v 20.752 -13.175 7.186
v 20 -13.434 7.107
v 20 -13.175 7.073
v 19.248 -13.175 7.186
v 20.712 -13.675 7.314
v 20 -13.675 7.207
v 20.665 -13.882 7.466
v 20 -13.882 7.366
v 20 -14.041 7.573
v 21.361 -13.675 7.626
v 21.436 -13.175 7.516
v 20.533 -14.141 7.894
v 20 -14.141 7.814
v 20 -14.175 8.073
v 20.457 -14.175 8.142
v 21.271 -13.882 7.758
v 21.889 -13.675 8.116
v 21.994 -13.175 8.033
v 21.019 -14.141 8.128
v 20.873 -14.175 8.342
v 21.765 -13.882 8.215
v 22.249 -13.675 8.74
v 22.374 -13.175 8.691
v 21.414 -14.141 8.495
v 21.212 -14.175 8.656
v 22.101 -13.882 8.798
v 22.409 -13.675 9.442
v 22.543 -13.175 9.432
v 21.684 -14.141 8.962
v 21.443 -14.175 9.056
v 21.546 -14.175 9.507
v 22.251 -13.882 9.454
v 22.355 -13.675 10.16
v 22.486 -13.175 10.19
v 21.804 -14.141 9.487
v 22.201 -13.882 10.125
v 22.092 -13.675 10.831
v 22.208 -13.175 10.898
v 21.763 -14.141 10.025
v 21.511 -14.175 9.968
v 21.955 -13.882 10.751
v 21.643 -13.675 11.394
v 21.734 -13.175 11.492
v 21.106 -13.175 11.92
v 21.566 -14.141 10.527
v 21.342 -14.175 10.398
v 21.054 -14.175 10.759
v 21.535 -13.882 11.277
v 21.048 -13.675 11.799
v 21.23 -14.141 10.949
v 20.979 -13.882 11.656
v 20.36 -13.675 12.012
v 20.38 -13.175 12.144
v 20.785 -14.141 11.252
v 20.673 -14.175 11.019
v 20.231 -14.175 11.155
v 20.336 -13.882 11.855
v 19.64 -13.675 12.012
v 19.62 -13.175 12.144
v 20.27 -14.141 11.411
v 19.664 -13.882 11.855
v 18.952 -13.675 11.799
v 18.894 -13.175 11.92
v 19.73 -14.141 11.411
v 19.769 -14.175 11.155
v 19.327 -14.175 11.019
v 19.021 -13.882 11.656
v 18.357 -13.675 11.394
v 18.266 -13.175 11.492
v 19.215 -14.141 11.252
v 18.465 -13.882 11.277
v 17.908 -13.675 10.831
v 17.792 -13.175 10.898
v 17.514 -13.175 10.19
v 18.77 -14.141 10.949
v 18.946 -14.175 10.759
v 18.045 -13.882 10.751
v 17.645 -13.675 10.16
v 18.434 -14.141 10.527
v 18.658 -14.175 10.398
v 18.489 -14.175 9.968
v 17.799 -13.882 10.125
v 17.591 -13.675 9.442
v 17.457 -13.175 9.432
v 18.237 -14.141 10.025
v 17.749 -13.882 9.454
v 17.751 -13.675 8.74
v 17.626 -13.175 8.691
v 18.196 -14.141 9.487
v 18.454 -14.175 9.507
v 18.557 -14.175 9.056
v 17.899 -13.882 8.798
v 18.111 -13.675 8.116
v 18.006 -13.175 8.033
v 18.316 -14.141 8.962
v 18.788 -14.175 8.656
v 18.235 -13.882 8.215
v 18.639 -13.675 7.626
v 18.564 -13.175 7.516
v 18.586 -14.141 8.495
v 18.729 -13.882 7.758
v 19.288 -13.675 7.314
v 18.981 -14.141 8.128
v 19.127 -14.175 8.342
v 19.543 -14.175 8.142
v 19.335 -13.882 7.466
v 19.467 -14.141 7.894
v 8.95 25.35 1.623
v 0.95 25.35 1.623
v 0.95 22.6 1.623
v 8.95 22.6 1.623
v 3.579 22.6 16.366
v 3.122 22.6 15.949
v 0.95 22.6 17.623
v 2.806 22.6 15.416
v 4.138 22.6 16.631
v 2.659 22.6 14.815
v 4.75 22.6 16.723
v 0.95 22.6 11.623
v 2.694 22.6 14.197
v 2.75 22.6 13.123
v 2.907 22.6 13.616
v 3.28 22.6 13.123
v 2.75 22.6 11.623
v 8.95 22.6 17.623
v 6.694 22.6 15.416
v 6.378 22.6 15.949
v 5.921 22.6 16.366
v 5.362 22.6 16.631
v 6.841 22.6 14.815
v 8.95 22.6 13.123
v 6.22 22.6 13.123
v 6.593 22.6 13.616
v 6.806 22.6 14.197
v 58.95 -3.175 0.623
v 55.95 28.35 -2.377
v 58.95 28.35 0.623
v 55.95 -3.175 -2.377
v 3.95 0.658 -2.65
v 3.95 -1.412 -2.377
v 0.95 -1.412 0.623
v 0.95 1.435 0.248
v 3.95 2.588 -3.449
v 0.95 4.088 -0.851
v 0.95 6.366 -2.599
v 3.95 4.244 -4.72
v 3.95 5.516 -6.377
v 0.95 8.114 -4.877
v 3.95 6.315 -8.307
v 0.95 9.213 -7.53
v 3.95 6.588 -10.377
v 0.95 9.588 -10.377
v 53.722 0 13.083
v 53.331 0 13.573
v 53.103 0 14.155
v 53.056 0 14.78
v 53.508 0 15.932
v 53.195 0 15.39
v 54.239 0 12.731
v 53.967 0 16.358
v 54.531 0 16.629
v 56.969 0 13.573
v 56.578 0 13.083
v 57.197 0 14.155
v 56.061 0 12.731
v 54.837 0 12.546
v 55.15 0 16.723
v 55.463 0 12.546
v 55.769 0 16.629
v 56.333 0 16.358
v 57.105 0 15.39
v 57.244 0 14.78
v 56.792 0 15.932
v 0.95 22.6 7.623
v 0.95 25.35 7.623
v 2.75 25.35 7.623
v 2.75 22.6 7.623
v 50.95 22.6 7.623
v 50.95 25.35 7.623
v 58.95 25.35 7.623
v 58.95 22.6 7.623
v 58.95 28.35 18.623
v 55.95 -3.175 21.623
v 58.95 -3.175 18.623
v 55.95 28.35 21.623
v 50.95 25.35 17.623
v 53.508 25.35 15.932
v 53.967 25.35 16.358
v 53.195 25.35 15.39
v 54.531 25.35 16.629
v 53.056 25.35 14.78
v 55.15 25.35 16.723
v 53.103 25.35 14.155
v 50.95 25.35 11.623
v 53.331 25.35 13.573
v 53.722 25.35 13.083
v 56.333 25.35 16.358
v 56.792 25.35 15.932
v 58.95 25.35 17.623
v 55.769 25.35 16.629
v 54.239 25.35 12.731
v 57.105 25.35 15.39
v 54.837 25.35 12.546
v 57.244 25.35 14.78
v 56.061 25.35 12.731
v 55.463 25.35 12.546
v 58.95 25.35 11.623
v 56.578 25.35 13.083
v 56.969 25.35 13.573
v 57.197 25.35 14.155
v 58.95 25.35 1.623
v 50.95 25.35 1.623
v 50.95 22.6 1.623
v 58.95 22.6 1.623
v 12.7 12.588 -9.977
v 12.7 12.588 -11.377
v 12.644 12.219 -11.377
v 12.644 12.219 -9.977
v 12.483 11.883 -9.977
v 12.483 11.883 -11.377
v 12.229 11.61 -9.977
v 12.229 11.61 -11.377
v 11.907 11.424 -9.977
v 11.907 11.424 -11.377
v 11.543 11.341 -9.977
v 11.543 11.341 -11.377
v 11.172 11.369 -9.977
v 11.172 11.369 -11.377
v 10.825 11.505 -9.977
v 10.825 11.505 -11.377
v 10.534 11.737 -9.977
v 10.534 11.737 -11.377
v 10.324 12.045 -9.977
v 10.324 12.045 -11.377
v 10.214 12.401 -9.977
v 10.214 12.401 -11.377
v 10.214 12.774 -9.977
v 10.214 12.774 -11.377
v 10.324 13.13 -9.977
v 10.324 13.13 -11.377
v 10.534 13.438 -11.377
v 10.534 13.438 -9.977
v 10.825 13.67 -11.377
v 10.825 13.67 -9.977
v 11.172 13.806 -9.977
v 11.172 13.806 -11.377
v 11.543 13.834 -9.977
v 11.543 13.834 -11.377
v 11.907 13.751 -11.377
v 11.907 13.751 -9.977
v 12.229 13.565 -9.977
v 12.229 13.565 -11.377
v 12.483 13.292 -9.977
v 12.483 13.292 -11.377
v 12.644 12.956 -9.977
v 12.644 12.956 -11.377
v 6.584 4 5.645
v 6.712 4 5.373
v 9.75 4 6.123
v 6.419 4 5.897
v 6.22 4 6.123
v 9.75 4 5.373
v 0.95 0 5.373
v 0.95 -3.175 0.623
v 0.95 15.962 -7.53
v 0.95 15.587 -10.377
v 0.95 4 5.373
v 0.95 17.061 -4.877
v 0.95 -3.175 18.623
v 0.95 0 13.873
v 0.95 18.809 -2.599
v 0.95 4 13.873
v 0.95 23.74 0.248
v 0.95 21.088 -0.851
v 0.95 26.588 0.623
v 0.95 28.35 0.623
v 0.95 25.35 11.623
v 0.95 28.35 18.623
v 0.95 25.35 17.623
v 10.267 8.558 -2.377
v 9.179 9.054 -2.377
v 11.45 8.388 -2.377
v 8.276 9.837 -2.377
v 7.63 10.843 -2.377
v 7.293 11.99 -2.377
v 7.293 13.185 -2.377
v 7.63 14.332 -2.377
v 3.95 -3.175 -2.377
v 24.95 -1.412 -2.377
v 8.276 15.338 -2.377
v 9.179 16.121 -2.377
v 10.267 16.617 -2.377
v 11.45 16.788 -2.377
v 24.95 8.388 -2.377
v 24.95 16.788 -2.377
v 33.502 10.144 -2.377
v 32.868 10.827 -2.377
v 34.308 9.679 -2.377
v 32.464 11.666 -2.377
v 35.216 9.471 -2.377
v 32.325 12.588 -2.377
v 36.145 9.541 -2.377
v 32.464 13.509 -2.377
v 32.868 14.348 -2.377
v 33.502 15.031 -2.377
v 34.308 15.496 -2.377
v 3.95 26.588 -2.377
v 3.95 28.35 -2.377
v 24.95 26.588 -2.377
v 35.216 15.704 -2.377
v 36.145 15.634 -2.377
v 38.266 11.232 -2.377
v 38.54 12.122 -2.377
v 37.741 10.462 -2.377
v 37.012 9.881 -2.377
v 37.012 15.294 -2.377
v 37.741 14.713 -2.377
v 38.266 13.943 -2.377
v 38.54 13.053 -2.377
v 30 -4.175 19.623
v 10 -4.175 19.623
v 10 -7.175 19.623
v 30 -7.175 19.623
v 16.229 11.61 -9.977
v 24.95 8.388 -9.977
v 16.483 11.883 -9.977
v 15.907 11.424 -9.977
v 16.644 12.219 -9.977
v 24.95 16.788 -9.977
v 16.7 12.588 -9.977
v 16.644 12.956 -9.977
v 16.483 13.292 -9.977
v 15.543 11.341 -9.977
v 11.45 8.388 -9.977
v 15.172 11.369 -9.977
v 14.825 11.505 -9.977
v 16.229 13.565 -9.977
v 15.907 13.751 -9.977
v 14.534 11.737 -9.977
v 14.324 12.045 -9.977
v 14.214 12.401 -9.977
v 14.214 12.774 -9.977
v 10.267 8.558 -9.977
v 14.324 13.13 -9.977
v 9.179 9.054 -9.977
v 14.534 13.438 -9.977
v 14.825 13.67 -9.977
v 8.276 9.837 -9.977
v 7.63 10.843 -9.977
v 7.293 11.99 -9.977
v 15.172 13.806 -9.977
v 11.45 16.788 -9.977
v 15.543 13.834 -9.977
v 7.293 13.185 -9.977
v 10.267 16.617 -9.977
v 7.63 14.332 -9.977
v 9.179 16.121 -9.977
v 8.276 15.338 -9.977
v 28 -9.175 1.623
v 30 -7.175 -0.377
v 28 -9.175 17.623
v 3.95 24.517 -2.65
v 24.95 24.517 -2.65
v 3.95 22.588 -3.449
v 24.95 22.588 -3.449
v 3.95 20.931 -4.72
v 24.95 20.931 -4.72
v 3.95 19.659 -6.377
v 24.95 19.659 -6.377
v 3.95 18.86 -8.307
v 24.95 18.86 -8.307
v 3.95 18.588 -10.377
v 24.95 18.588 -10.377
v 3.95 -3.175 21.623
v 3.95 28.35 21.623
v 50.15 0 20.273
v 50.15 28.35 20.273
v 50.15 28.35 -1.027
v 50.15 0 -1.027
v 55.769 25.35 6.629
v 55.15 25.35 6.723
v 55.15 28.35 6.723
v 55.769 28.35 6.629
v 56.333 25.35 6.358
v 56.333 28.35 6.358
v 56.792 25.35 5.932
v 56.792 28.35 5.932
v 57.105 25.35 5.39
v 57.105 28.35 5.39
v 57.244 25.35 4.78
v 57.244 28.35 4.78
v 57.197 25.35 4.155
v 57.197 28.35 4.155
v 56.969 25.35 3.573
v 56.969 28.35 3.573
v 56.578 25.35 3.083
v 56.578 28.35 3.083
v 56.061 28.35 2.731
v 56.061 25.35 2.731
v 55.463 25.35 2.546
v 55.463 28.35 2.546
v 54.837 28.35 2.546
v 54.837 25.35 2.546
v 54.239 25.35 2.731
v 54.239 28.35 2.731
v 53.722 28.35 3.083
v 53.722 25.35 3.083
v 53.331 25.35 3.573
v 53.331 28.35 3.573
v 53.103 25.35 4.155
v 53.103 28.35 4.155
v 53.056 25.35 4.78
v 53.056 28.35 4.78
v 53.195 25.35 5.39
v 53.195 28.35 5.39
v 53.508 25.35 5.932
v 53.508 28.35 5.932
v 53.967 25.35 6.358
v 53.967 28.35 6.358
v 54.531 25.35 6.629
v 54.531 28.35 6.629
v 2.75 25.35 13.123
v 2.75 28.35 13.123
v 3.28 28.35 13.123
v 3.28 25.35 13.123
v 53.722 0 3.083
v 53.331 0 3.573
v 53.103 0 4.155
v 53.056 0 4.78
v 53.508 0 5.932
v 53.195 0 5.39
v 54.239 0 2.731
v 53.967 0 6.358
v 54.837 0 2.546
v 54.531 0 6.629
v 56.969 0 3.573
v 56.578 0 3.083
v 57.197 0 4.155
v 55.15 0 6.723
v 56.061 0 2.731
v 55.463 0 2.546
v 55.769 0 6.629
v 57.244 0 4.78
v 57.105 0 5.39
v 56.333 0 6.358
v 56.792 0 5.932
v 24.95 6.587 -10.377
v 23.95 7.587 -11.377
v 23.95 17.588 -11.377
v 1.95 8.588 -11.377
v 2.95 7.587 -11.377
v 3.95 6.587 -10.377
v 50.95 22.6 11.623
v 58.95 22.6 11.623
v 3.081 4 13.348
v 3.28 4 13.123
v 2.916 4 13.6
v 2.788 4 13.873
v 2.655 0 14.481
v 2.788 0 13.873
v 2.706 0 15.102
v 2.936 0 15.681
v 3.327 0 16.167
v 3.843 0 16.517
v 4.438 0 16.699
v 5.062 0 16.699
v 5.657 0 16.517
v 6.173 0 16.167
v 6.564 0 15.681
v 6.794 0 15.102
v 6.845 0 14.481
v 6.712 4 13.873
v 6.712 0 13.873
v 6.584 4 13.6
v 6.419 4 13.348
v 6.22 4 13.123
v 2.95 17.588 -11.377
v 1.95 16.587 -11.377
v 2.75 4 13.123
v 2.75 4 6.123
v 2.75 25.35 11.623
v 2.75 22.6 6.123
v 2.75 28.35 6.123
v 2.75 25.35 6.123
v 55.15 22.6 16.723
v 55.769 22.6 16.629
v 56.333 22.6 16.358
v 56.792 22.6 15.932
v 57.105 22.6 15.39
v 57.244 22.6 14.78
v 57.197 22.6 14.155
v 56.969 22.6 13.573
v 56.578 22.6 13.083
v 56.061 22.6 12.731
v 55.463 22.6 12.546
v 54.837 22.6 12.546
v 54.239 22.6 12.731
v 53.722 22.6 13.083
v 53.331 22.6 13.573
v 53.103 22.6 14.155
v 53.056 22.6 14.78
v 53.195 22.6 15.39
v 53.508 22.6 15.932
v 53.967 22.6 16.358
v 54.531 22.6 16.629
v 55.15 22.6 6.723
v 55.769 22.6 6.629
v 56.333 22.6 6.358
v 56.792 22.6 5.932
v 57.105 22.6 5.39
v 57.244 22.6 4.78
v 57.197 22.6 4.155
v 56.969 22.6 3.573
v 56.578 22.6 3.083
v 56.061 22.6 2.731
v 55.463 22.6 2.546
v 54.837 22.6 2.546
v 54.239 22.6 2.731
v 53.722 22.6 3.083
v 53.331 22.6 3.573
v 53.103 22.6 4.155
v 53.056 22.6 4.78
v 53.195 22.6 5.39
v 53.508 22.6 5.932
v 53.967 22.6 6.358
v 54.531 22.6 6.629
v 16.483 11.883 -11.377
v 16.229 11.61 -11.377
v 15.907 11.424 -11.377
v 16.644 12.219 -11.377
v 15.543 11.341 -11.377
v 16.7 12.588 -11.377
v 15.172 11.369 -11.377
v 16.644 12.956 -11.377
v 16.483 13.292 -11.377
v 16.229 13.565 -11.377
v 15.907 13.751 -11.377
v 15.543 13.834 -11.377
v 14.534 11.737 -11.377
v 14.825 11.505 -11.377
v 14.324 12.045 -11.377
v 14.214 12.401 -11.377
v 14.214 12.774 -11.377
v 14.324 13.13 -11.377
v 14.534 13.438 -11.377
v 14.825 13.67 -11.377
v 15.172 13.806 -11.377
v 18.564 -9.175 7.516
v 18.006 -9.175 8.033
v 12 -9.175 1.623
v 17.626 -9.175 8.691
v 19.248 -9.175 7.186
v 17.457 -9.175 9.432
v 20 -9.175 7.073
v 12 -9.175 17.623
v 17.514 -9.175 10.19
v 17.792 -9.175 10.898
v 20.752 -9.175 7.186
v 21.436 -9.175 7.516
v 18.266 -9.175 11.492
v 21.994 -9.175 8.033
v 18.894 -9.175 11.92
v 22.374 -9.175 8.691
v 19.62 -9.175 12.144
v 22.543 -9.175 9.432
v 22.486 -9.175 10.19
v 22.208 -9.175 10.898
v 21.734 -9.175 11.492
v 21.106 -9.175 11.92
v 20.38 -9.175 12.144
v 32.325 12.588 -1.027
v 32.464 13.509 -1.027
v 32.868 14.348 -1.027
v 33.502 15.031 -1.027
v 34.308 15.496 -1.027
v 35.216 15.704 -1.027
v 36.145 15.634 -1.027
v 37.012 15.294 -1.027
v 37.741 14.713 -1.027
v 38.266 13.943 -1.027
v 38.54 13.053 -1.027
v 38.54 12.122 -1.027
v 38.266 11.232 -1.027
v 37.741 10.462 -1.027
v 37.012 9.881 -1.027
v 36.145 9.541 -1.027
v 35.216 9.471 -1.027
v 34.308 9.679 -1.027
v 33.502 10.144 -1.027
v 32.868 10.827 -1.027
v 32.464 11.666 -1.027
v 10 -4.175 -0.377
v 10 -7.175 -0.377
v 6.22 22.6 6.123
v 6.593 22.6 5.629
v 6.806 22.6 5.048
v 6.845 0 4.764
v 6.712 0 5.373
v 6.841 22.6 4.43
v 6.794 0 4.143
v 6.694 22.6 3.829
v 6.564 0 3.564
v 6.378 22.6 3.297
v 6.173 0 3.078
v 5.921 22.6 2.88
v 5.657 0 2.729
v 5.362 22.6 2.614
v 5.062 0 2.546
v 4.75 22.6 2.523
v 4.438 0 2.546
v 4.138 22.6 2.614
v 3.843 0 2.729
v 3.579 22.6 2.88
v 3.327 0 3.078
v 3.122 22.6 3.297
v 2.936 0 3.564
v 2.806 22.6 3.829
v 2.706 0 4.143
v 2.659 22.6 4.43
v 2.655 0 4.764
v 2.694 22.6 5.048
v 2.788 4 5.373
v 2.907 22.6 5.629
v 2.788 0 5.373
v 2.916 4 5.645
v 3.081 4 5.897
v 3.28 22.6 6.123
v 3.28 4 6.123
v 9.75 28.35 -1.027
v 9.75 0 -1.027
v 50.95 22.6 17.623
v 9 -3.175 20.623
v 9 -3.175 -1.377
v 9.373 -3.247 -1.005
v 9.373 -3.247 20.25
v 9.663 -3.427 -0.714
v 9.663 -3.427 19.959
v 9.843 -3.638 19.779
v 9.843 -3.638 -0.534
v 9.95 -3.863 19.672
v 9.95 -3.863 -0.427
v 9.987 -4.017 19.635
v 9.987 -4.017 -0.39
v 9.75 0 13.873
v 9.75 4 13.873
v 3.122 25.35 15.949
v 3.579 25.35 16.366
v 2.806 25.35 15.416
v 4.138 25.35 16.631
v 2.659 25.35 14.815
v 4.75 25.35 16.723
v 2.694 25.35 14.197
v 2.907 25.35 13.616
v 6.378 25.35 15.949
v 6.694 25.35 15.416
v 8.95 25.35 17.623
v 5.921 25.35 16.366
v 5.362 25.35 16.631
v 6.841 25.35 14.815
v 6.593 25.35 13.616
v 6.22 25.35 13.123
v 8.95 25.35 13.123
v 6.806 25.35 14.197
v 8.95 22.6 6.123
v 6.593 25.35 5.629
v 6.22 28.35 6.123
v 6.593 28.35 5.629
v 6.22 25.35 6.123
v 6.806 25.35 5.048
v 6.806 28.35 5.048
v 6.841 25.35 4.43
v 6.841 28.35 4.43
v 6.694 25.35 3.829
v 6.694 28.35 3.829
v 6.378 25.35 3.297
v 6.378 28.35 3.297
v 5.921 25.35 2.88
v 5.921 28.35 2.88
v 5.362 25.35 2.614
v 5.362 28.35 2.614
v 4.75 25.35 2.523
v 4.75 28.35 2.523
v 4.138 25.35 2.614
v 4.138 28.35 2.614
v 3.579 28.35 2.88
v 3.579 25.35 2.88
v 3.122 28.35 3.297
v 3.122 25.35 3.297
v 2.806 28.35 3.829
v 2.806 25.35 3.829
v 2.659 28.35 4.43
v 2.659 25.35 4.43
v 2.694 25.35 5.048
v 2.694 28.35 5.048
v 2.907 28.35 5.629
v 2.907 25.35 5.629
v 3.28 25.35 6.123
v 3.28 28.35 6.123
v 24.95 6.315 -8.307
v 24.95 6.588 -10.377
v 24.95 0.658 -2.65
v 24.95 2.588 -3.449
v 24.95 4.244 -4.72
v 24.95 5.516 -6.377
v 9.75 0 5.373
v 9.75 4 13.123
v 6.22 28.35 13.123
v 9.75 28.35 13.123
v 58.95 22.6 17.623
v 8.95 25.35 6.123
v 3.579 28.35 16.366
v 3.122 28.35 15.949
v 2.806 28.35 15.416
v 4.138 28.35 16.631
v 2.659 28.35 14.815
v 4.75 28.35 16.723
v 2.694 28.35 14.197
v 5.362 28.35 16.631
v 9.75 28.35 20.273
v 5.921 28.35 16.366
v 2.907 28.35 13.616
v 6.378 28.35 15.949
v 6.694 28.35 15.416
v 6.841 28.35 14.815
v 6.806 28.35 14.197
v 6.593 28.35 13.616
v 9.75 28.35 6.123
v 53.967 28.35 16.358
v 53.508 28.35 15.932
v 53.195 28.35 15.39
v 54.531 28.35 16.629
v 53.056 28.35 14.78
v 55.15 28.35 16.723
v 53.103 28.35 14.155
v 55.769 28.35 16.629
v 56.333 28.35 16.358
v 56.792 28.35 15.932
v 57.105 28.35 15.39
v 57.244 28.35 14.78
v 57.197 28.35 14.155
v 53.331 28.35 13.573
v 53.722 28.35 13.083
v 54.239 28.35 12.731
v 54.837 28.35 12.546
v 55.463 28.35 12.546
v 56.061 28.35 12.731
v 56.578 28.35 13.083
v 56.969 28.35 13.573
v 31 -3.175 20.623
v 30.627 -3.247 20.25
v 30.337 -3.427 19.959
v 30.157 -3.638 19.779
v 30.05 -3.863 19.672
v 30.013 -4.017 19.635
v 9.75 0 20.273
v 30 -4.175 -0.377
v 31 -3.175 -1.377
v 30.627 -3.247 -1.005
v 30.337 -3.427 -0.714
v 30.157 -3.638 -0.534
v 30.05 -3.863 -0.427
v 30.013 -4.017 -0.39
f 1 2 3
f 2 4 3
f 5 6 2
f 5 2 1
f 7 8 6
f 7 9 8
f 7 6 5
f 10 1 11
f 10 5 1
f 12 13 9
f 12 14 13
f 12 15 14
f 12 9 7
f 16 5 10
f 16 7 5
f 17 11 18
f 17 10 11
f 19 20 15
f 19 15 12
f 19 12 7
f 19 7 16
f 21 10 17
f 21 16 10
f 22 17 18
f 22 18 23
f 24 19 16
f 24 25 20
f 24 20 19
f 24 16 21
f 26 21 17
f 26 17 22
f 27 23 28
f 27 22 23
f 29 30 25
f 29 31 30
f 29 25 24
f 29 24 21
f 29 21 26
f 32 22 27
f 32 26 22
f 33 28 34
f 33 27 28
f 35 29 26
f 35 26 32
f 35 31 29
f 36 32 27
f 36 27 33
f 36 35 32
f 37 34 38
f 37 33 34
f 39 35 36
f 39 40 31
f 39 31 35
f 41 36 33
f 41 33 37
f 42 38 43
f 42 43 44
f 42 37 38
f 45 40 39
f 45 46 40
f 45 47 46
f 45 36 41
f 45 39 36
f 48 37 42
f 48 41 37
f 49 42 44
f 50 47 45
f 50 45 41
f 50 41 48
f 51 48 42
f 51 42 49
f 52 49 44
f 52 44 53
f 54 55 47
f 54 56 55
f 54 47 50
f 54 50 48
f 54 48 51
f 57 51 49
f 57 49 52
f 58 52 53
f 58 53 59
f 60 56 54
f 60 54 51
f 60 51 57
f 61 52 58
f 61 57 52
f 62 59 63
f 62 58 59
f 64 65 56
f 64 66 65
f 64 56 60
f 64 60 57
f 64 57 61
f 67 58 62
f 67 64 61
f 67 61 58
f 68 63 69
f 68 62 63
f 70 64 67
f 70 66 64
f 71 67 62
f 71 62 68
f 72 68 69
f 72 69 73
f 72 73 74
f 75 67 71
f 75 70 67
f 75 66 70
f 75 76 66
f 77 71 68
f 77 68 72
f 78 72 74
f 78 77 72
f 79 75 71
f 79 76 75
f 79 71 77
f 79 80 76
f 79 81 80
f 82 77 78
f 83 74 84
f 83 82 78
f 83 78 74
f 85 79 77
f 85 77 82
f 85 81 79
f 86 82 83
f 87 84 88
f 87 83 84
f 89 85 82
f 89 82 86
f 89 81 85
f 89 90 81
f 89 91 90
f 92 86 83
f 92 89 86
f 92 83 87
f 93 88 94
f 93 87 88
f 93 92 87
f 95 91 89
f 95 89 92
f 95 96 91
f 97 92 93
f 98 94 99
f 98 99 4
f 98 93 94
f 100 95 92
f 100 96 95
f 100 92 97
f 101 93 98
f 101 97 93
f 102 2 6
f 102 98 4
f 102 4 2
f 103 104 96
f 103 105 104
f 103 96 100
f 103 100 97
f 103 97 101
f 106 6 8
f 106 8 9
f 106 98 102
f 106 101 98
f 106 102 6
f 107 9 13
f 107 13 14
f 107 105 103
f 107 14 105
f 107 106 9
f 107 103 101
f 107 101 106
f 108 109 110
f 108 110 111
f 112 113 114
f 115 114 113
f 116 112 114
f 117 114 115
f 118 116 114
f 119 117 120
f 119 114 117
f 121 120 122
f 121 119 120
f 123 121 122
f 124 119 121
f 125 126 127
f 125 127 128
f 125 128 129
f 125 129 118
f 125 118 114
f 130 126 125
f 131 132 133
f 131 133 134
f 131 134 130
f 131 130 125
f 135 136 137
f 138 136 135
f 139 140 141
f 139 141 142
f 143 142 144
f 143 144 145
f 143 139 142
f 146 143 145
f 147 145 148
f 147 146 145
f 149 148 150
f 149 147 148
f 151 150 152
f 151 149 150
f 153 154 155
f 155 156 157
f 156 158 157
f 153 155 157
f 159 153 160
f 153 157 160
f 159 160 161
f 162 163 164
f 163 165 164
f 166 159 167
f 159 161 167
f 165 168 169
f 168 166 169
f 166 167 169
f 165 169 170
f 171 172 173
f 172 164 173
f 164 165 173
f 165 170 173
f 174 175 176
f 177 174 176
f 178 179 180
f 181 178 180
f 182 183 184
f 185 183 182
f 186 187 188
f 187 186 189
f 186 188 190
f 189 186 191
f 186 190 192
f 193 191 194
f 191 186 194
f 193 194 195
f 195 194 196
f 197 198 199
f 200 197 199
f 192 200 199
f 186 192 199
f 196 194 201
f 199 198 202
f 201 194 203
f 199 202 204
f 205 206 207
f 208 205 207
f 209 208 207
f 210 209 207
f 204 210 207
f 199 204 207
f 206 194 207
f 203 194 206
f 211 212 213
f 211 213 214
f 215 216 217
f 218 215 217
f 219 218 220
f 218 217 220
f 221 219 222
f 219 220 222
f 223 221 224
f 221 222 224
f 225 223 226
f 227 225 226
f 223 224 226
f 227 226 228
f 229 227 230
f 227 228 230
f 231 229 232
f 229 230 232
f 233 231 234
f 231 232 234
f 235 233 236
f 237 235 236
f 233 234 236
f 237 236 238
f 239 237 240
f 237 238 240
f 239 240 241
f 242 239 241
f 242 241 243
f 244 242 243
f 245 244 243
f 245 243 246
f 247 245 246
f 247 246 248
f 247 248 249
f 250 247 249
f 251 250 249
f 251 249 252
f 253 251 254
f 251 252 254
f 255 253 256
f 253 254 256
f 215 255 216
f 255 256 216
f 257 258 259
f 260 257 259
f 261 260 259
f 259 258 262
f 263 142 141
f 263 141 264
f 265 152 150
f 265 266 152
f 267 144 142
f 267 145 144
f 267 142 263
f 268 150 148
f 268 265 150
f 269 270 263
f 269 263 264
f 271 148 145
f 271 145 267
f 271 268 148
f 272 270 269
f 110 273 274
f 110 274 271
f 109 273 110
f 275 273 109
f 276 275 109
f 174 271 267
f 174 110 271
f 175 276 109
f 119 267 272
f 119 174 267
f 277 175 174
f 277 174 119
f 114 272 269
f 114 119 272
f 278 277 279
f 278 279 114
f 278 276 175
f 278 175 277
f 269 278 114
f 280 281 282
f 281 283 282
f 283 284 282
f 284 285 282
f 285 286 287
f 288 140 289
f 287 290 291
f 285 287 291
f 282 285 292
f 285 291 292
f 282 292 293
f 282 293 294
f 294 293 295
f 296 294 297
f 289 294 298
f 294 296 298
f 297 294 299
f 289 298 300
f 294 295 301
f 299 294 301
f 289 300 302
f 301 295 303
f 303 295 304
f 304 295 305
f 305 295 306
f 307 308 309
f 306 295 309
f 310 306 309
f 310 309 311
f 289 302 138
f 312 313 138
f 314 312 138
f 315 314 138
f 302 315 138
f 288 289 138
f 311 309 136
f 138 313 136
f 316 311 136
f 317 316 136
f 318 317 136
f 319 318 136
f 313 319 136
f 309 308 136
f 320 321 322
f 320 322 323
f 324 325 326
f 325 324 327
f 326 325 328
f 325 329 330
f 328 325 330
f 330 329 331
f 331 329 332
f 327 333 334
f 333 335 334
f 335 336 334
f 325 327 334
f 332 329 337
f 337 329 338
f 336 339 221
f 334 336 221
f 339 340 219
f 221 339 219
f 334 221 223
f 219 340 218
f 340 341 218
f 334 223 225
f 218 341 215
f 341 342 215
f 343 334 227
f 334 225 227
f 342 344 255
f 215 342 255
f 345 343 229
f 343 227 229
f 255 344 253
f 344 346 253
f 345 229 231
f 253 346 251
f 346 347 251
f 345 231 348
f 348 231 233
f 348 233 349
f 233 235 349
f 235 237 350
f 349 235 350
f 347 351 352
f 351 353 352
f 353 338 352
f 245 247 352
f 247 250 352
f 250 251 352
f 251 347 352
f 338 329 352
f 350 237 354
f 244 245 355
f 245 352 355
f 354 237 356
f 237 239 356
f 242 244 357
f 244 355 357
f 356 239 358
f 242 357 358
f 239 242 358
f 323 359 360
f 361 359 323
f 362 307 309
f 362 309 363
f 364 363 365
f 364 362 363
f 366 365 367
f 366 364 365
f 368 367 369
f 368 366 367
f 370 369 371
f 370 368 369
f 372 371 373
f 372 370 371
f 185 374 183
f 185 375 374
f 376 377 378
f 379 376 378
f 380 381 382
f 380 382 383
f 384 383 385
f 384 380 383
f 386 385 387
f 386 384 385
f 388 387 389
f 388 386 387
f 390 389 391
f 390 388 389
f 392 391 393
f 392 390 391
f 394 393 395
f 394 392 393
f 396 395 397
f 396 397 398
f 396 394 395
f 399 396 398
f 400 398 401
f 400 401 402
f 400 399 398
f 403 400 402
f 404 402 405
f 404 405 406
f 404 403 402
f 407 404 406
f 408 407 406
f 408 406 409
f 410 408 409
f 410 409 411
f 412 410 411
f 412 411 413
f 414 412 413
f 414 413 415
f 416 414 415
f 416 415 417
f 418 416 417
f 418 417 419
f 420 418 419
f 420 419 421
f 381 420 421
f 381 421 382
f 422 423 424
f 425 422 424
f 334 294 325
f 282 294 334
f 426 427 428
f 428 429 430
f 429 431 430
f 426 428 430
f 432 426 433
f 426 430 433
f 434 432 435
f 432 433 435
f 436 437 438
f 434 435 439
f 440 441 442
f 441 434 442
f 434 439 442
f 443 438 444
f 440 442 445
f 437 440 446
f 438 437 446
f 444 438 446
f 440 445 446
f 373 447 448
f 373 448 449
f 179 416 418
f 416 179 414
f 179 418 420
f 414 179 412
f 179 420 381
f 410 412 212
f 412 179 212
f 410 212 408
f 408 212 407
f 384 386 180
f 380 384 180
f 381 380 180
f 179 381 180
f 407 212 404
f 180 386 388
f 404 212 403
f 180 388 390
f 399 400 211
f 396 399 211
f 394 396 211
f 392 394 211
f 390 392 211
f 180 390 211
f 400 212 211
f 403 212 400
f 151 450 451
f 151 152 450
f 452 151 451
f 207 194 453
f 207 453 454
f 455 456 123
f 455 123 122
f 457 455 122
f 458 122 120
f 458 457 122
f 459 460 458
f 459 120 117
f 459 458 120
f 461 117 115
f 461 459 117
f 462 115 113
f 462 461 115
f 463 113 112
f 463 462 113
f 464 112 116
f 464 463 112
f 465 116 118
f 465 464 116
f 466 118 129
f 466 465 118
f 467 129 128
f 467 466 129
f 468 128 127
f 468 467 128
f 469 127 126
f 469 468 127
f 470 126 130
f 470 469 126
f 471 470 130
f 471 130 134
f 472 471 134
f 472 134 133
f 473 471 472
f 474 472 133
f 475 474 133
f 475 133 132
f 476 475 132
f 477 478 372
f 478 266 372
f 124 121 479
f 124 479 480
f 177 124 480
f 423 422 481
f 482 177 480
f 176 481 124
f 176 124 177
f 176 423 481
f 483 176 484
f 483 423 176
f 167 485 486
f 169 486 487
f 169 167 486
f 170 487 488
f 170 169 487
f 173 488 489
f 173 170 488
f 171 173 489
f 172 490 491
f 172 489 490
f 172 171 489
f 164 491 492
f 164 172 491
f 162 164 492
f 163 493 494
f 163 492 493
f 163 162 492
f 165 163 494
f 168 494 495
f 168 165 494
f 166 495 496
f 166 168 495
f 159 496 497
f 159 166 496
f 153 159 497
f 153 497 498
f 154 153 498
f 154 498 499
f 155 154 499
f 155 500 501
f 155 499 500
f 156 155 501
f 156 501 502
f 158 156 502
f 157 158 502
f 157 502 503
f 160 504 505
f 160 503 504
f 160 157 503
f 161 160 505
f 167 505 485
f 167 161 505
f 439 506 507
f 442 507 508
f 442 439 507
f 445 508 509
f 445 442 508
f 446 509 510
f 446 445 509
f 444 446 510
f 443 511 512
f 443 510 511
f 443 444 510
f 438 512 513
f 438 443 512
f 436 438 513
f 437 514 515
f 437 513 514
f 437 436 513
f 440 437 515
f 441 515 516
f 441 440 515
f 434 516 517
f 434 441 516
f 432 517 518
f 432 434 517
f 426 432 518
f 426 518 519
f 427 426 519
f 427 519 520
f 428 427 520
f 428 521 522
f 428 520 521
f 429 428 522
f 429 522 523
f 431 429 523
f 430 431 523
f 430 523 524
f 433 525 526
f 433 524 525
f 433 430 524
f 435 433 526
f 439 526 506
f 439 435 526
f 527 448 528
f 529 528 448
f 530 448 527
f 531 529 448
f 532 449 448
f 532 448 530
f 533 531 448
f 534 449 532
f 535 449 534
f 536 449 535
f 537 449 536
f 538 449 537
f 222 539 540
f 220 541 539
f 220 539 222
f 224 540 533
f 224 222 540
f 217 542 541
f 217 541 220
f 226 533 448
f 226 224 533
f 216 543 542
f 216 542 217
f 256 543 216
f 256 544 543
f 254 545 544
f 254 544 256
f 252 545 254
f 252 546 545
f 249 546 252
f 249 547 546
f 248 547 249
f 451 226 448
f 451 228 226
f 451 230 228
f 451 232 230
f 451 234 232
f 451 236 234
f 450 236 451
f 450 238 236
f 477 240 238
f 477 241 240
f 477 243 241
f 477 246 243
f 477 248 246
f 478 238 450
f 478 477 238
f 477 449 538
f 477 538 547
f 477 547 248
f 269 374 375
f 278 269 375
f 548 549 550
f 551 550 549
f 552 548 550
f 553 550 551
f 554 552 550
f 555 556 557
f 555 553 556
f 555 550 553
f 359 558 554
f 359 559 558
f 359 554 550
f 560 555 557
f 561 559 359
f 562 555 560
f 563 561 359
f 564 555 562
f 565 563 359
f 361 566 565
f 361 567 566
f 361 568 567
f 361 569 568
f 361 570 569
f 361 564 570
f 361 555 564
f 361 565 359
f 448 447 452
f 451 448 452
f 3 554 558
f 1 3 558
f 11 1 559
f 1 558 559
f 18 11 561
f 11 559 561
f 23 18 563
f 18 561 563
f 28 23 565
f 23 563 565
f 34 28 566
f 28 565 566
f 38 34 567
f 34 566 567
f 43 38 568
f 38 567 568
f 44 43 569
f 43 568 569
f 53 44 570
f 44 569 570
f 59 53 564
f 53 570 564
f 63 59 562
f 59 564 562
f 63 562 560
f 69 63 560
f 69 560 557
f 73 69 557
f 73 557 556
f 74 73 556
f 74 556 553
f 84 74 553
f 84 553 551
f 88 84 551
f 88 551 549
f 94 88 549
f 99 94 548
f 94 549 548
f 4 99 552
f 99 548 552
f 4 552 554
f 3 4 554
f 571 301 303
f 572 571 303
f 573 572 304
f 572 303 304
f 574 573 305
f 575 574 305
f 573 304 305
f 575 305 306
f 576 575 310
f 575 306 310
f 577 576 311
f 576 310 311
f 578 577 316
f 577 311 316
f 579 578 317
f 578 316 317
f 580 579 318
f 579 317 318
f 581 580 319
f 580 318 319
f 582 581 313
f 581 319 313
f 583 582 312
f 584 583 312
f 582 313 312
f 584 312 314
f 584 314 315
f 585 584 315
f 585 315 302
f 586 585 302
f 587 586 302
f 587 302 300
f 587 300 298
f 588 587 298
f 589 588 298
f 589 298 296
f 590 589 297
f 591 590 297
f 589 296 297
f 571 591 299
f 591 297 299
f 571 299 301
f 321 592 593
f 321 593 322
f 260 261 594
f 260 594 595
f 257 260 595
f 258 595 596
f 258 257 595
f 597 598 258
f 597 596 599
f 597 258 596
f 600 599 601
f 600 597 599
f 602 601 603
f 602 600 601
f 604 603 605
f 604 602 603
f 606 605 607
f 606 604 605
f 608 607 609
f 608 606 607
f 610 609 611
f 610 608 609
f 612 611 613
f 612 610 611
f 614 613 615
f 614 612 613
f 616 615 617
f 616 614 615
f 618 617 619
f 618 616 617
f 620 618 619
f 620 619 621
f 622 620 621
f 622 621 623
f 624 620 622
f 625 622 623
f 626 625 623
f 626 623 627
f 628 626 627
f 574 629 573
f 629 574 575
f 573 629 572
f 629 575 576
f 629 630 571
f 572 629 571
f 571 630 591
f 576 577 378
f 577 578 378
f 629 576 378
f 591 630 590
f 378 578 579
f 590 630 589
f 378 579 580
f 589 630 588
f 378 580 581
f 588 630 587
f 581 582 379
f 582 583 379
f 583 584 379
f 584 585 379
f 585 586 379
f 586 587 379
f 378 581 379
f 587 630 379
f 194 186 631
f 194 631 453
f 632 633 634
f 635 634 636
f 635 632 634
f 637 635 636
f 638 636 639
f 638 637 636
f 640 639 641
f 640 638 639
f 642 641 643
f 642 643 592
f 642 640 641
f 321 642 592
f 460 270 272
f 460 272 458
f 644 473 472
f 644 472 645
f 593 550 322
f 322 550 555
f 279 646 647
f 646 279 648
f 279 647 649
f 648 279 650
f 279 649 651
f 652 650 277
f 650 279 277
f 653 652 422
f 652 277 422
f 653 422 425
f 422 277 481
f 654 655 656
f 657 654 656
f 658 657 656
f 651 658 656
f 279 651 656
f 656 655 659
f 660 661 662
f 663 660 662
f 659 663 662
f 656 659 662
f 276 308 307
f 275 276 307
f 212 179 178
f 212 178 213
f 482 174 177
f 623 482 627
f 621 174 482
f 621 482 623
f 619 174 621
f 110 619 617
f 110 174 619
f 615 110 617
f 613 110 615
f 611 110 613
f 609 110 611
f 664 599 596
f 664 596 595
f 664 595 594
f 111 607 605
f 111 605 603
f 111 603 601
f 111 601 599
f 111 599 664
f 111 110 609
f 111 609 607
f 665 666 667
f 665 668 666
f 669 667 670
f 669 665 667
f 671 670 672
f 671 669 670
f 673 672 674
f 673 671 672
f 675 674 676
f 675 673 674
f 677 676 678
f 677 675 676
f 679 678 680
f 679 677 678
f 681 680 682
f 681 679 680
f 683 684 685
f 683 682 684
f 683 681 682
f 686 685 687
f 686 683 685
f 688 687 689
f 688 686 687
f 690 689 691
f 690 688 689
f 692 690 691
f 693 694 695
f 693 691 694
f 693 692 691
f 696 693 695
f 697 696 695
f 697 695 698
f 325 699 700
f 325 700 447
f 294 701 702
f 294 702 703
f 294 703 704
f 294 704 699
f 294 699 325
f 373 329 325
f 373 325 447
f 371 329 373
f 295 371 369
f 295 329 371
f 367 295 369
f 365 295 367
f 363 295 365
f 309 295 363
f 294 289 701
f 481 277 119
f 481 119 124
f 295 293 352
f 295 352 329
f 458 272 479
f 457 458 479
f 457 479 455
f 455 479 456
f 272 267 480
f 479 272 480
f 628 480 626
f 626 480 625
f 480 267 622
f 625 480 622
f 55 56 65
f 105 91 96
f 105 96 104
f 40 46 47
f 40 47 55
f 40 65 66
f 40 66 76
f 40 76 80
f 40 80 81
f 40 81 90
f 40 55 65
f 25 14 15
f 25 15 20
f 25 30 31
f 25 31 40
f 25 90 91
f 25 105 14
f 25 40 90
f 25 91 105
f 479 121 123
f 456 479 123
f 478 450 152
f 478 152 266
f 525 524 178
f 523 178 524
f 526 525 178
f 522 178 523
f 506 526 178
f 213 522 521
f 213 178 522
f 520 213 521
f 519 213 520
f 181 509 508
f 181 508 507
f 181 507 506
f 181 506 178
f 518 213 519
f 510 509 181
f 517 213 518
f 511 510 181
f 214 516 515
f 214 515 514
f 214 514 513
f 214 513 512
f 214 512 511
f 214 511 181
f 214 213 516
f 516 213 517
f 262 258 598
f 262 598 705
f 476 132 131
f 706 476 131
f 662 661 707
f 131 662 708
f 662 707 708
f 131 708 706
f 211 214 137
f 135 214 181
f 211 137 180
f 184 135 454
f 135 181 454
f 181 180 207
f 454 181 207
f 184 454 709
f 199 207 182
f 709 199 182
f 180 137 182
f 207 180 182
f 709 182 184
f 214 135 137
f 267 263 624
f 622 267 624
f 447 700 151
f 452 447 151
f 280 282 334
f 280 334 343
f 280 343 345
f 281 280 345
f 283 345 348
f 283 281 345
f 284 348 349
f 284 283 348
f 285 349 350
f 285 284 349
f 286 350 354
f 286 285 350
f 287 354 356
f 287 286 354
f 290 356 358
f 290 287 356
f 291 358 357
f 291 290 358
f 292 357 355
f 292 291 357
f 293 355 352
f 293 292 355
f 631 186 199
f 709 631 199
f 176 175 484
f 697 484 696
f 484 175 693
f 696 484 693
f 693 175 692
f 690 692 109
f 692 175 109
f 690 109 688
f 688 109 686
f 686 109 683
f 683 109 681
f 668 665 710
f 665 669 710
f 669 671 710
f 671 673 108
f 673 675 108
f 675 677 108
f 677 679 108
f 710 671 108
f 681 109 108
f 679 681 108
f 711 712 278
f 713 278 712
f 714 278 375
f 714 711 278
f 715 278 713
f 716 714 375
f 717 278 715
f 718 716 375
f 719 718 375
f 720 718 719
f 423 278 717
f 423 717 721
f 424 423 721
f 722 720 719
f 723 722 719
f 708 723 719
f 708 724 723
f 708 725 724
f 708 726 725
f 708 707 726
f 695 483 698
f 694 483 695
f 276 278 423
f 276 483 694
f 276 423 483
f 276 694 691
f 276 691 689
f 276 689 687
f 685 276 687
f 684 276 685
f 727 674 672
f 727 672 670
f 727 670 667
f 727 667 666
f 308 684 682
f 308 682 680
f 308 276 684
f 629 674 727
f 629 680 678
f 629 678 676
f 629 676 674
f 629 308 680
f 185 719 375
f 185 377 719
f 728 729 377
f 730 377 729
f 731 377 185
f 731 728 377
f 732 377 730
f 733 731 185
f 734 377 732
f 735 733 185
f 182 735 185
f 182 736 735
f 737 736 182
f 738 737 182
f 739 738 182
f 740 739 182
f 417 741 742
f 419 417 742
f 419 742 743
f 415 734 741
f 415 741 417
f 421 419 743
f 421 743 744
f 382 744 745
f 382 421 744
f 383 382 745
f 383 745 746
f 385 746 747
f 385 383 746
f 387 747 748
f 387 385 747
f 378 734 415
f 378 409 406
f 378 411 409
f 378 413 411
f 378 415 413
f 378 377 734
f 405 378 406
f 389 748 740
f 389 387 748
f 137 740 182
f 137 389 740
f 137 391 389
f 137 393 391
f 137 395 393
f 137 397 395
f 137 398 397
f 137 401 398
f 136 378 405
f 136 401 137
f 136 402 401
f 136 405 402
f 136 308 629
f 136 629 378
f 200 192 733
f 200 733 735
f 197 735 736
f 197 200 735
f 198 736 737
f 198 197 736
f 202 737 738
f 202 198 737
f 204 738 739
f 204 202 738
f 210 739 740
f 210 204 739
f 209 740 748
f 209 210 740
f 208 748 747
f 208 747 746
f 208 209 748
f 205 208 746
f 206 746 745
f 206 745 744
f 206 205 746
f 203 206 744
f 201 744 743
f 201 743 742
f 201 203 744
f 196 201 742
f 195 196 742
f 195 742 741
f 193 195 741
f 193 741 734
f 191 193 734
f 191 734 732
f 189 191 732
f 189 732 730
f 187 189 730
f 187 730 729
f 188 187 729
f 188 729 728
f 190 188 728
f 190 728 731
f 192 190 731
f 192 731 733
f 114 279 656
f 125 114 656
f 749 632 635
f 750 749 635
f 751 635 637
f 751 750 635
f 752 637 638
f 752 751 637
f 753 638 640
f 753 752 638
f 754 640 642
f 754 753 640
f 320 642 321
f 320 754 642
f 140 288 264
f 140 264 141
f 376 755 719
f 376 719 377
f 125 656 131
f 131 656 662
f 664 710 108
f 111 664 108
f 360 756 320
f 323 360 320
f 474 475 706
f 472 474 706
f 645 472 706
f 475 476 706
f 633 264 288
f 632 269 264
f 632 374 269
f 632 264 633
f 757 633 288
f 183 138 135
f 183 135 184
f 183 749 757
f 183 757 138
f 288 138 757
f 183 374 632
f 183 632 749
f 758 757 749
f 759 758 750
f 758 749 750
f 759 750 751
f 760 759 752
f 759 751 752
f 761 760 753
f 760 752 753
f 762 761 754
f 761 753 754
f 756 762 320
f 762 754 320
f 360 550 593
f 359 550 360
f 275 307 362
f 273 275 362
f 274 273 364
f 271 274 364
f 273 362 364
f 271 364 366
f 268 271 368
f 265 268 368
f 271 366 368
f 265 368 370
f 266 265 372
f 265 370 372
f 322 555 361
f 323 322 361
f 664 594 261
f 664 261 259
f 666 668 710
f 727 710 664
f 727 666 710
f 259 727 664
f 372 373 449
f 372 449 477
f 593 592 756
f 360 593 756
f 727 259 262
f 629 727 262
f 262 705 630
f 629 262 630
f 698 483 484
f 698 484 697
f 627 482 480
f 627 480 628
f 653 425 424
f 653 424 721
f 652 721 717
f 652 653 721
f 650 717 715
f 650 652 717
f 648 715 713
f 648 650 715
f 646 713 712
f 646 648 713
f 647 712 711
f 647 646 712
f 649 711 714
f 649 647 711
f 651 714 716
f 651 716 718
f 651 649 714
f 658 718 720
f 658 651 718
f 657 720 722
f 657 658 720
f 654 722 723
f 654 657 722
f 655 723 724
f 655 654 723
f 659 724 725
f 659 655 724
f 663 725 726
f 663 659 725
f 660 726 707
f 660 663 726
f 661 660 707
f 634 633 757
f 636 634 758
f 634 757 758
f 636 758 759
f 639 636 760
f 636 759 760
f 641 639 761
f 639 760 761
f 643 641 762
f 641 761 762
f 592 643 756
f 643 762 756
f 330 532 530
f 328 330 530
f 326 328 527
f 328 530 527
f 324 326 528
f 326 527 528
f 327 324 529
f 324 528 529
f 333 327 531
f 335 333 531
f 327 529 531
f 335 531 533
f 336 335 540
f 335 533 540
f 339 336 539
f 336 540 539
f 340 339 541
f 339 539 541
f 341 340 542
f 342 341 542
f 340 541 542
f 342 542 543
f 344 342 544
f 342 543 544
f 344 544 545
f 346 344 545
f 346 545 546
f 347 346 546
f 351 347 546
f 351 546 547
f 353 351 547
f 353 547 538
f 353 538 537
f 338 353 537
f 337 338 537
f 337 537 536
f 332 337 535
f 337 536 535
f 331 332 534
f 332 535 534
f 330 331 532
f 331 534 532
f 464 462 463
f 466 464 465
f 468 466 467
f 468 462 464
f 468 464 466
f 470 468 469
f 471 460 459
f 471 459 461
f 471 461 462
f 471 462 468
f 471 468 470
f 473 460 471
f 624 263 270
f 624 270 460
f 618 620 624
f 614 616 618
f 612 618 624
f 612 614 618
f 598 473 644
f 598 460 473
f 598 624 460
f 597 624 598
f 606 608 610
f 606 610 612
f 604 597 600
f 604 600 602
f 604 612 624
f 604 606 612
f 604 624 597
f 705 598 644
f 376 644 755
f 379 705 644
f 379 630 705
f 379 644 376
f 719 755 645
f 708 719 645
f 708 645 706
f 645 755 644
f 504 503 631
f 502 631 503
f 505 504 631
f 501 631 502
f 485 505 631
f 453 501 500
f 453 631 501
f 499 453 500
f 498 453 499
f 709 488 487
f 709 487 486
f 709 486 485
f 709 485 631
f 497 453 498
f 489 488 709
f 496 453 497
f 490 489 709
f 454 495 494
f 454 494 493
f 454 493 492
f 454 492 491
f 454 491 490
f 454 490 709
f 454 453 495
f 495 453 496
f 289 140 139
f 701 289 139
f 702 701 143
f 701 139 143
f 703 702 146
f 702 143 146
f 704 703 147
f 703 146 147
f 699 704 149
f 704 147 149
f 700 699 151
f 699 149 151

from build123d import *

# Parameters (mm, degrees)
SKETCH1_W           = 58
SKETCH1_H           = 24
SKETCH1_R           = 2.1
SKETCH1_W_2         = 40.4
SKETCH1_H_2         = 21.3
BOSS_EXTRUDE1_DEPTH = 28.35
SKETCH11_W          = 58
SKETCH11_H          = 24
BOSS_EXTRUDE5_DEPTH = 3.175
SKETCH14_W          = 24
SKETCH14_H          = 12
BOSS_EXTRUDE7_DEPTH = 9
CUT_EXTRUDE1_START  = -4.5
CUT_EXTRUDE1_DEPTH  = 7.6
FILLET1_R           = 8
CHAMFER2_SIZE       = 3
CHAMFER3_SIZE       = 1
SKETCH19_W          = 8
SKETCH19_H          = 6
CUT_EXTRUDE3_DEPTH  = 2.75
SKETCH20_W          = 8.8
SKETCH20_H          = 8.5
CUT_EXTRUDE4_DEPTH  = 4
SKETCH21_W          = 20
SKETCH21_H          = 20
BOSS_EXTRUDE8_DEPTH = 6
SKETCH13_R          = 2.55
BOSS_EXTRUDE6_DEPTH = 5
FILLET4_R           = 1
CHAMFER4_SIZE       = 2
FILLET5_R           = 1
CUT_EXTRUDE5_REACH  = 77.835
SKETCH22_W          = 7
SKETCH22_H          = 7
CUT_EXTRUDE6_DEPTH  = 1.4
SKETCH24_R          = 3.125
CUT_EXTRUDE7_DEPTH  = 1.35


with BuildPart() as part:
    # Sketch1 → Boss-Extrude1 (new body)
    with BuildSketch(Plane(origin=(0, 0, 0), x_dir=(1, 0, 0), z_dir=(0, 1, 0))):
        with Locations((29.95, -9.622651473)):
            Rectangle(SKETCH1_W, SKETCH1_H)
        with Locations(Location((55.15, -4.622651473, 0), (0, 0, 270))):
            Circle(SKETCH1_R, mode=Mode.SUBTRACT)
        with Locations(Location((55.15, -14.622651473, 0), (0, 0, 270))):
            Circle(SKETCH1_R, mode=Mode.SUBTRACT)
        with Locations(Location((4.75, -14.622651473, 0), (0, 0, 90))):
            Circle(SKETCH1_R, mode=Mode.SUBTRACT)
        with Locations(Location((4.75, -4.622651473, 0), (0, 0, 90))):
            Circle(SKETCH1_R, mode=Mode.SUBTRACT)
        with Locations((29.95, -9.622651473)):
            Rectangle(SKETCH1_W_2, SKETCH1_H_2, mode=Mode.SUBTRACT)
    extrude(amount=BOSS_EXTRUDE1_DEPTH)

    # Sketch11 → Boss-Extrude5 (add)
    with BuildSketch(Plane.XZ):
        with Locations((29.95, 9.622651473)):
            Rectangle(SKETCH11_W, SKETCH11_H)
    extrude(amount=BOSS_EXTRUDE5_DEPTH)

    # Sketch14 → Boss-Extrude7 (add)
    with BuildSketch(Plane(origin=(0, 0, -2.377348527), x_dir=(-1, 0, 0), z_dir=(0, 0, -1))):
        with Locations((-12.95, 12.5875)):
            Rectangle(SKETCH14_W, SKETCH14_H)
    extrude(amount=BOSS_EXTRUDE7_DEPTH)

    # Sketch16 → Cut-Extrude1 (cut)
    with BuildSketch(Plane(origin=(0, 0, -6.877348527), x_dir=(-1, 0, 0), z_dir=(0, 0, -1)).offset(CUT_EXTRUDE1_START)):
        with BuildLine():
            Line((-11.45, 16.7875), (-24.95, 16.7875))
            Line((-24.95, 16.7875), (-24.95, 8.3875))
            Line((-24.95, 8.3875), (-11.45, 8.3875))
            ThreePointArc((-11.45, 8.3875), (-7.25, 12.5875), (-11.45, 16.7875))
        make_face()
    extrude(amount=CUT_EXTRUDE1_DEPTH, mode=Mode.SUBTRACT)

    # Fillet1
    fillet1_edges = [part.edges().sort_by_distance(p)[0] for p in [
        (12.95, 6.5875, -2.377348527),
        (12.95, 18.5875, -2.377348527),
    ]]
    fillet(fillet1_edges, radius=FILLET1_R)

    # Chamfer2
    chamfer2_edges = [part.edges().sort_by_distance(p)[0] for p in [
        (0.95, 6.5875, -10.877348527),
        (0.95, 18.5875, -10.877348527),
        (58.95, 12.5875, 21.622651473),
        (0.95, 12.5875, 21.622651473),
        (0.95, 27.46875, -2.377348527),
        (58.95, 12.5875, -2.377348527),
        (0.95, -2.29375, -2.377348527),
        (0.95, 4.244354249, -4.720494277),
        (0.95, 20.930645751, -4.720494277),
    ]]
    chamfer(chamfer2_edges, length=CHAMFER2_SIZE)

    # Chamfer3
    chamfer3_edges = [part.edges().sort_by_distance(p)[0] for p in [
        (14.45, 6.5875, -11.377348527),
        (24.95, 12.5875, -11.377348527),
        (14.45, 18.5875, -11.377348527),
        (0.95, 12.5875, -11.377348527),
    ]]
    chamfer(chamfer3_edges, length=CHAMFER3_SIZE - 0.0001)  # a hair under: the kernel refuses the full size

    # Sketch19 → Cut-Extrude3 (cut)
    with BuildSketch(Plane(origin=(0, 25.35, 0), x_dir=(1, 0, 0), z_dir=(0, 1, 0))):
        with Locations((4.95, -4.622651473)):
            Rectangle(SKETCH19_W, SKETCH19_H)
        with Locations((4.95, -14.622651473)):
            Rectangle(SKETCH19_W, SKETCH19_H)
        with Locations((54.95, -14.622651473)):
            Rectangle(SKETCH19_W, SKETCH19_H)
        with Locations((54.95, -4.622651473)):
            Rectangle(SKETCH19_W, SKETCH19_H)
    extrude(amount=-CUT_EXTRUDE3_DEPTH, mode=Mode.SUBTRACT)

    # Sketch20 → Cut-Extrude4 (cut)
    with BuildSketch(Plane(origin=(0, 0, 0), x_dir=(1, 0, 0), z_dir=(0, 1, 0))):
        with Locations((5.35, -9.622651473)):
            Rectangle(SKETCH20_W, SKETCH20_H)
    extrude(amount=CUT_EXTRUDE4_DEPTH, mode=Mode.SUBTRACT)

    # Sketch21 → Boss-Extrude8 (add)
    with BuildSketch(Plane.XZ.offset(3.175)):
        with Locations((20, 9.622651473)):
            Rectangle(SKETCH21_W, SKETCH21_H)
    extrude(amount=BOSS_EXTRUDE8_DEPTH)

    # Sketch13 → Boss-Extrude6 (add)
    with BuildSketch(Plane.XZ.offset(9.175)):
        with Locations(Location((20, 9.622651473, 0), (0, 0, 270))):
            Circle(SKETCH13_R)
    extrude(amount=BOSS_EXTRUDE6_DEPTH)

    # Fillet4
    fillet4_edges = [part.edges().sort_by_distance(p)[0] for p in [
        (10, -3.175, 9.622651473),
        (20, -3.175, -0.377348527),
        (30, -3.175, 9.622651473),
        (20, -3.175, 19.622651473),
    ]]
    fillet(fillet4_edges, radius=FILLET4_R)

    # Chamfer4
    chamfer4_edges = [part.edges().sort_by_distance(p)[0] for p in [
        (10, -9.175, 9.622651473),
        (20, -9.175, -0.377348527),
        (30, -9.175, 9.622651473),
        (20, -9.175, 19.622651473),
    ]]
    chamfer(chamfer4_edges, length=CHAMFER4_SIZE)

    # Fillet5
    fillet5_edges = [part.edges().sort_by_distance(p)[0] for p in [
        (20, -14.175, 12.172651473),
    ]]
    fillet(fillet5_edges, radius=FILLET5_R)

    # Cut-Extrude5: up to this face of the body (flat: up to its plane)
    cut_extrude5_end = Plane(part.part.faces().sort_by_distance((27.49586415, 0, 9.622651473))[0])
    # Sketch22 → Cut-Extrude5 (cut, up to the picked face)
    with BuildSketch(Plane(origin=(0, 28.35, 0), x_dir=(1, 0, 0), z_dir=(0, 1, 0)), mode=Mode.PRIVATE) as cut_extrude5_sk1:
        with Locations((6.25, -9.622651473)):
            Rectangle(SKETCH22_W, SKETCH22_H)
    cut_extrude5_tool1 = split(extrude(cut_extrude5_sk1.sketch, amount=-CUT_EXTRUDE5_REACH, mode=Mode.PRIVATE), bisect_by=cut_extrude5_end, keep=Keep.BOTH, mode=Mode.PRIVATE)
    add(cut_extrude5_tool1.solids().sort_by(Axis((6.25, 28.35, 9.622651), (0, -1, 0)))[0], mode=Mode.SUBTRACT)

    # Sketch23 → Cut-Extrude6 (cut)
    with BuildSketch(Plane(origin=(0, 0, -11.377348527), x_dir=(-1, 0, 0), z_dir=(0, 0, -1))):
        with BuildLine():
            ThreePointArc((-10.2, 12.5875), (-11.45, 13.8375), (-12.7, 12.5875))
            ThreePointArc((-12.7, 12.5875), (-11.45, 11.3375), (-10.2, 12.5875))
        make_face()
        with BuildLine():
            ThreePointArc((-14.2, 12.5875), (-15.45, 13.8375), (-16.7, 12.5875))
            ThreePointArc((-16.7, 12.5875), (-15.45, 11.3375), (-14.2, 12.5875))
        make_face()
    extrude(amount=-CUT_EXTRUDE6_DEPTH, mode=Mode.SUBTRACT)

    # Sketch24 → Cut-Extrude7 (cut)
    with BuildSketch(Plane(origin=(0, 0, -2.377348527), x_dir=(-1, 0, 0), z_dir=(0, 0, -1))):
        with Locations((-35.45, 12.5875)):
            Circle(SKETCH24_R)
    extrude(amount=-CUT_EXTRUDE7_DEPTH, mode=Mode.SUBTRACT)


solid = part.part
